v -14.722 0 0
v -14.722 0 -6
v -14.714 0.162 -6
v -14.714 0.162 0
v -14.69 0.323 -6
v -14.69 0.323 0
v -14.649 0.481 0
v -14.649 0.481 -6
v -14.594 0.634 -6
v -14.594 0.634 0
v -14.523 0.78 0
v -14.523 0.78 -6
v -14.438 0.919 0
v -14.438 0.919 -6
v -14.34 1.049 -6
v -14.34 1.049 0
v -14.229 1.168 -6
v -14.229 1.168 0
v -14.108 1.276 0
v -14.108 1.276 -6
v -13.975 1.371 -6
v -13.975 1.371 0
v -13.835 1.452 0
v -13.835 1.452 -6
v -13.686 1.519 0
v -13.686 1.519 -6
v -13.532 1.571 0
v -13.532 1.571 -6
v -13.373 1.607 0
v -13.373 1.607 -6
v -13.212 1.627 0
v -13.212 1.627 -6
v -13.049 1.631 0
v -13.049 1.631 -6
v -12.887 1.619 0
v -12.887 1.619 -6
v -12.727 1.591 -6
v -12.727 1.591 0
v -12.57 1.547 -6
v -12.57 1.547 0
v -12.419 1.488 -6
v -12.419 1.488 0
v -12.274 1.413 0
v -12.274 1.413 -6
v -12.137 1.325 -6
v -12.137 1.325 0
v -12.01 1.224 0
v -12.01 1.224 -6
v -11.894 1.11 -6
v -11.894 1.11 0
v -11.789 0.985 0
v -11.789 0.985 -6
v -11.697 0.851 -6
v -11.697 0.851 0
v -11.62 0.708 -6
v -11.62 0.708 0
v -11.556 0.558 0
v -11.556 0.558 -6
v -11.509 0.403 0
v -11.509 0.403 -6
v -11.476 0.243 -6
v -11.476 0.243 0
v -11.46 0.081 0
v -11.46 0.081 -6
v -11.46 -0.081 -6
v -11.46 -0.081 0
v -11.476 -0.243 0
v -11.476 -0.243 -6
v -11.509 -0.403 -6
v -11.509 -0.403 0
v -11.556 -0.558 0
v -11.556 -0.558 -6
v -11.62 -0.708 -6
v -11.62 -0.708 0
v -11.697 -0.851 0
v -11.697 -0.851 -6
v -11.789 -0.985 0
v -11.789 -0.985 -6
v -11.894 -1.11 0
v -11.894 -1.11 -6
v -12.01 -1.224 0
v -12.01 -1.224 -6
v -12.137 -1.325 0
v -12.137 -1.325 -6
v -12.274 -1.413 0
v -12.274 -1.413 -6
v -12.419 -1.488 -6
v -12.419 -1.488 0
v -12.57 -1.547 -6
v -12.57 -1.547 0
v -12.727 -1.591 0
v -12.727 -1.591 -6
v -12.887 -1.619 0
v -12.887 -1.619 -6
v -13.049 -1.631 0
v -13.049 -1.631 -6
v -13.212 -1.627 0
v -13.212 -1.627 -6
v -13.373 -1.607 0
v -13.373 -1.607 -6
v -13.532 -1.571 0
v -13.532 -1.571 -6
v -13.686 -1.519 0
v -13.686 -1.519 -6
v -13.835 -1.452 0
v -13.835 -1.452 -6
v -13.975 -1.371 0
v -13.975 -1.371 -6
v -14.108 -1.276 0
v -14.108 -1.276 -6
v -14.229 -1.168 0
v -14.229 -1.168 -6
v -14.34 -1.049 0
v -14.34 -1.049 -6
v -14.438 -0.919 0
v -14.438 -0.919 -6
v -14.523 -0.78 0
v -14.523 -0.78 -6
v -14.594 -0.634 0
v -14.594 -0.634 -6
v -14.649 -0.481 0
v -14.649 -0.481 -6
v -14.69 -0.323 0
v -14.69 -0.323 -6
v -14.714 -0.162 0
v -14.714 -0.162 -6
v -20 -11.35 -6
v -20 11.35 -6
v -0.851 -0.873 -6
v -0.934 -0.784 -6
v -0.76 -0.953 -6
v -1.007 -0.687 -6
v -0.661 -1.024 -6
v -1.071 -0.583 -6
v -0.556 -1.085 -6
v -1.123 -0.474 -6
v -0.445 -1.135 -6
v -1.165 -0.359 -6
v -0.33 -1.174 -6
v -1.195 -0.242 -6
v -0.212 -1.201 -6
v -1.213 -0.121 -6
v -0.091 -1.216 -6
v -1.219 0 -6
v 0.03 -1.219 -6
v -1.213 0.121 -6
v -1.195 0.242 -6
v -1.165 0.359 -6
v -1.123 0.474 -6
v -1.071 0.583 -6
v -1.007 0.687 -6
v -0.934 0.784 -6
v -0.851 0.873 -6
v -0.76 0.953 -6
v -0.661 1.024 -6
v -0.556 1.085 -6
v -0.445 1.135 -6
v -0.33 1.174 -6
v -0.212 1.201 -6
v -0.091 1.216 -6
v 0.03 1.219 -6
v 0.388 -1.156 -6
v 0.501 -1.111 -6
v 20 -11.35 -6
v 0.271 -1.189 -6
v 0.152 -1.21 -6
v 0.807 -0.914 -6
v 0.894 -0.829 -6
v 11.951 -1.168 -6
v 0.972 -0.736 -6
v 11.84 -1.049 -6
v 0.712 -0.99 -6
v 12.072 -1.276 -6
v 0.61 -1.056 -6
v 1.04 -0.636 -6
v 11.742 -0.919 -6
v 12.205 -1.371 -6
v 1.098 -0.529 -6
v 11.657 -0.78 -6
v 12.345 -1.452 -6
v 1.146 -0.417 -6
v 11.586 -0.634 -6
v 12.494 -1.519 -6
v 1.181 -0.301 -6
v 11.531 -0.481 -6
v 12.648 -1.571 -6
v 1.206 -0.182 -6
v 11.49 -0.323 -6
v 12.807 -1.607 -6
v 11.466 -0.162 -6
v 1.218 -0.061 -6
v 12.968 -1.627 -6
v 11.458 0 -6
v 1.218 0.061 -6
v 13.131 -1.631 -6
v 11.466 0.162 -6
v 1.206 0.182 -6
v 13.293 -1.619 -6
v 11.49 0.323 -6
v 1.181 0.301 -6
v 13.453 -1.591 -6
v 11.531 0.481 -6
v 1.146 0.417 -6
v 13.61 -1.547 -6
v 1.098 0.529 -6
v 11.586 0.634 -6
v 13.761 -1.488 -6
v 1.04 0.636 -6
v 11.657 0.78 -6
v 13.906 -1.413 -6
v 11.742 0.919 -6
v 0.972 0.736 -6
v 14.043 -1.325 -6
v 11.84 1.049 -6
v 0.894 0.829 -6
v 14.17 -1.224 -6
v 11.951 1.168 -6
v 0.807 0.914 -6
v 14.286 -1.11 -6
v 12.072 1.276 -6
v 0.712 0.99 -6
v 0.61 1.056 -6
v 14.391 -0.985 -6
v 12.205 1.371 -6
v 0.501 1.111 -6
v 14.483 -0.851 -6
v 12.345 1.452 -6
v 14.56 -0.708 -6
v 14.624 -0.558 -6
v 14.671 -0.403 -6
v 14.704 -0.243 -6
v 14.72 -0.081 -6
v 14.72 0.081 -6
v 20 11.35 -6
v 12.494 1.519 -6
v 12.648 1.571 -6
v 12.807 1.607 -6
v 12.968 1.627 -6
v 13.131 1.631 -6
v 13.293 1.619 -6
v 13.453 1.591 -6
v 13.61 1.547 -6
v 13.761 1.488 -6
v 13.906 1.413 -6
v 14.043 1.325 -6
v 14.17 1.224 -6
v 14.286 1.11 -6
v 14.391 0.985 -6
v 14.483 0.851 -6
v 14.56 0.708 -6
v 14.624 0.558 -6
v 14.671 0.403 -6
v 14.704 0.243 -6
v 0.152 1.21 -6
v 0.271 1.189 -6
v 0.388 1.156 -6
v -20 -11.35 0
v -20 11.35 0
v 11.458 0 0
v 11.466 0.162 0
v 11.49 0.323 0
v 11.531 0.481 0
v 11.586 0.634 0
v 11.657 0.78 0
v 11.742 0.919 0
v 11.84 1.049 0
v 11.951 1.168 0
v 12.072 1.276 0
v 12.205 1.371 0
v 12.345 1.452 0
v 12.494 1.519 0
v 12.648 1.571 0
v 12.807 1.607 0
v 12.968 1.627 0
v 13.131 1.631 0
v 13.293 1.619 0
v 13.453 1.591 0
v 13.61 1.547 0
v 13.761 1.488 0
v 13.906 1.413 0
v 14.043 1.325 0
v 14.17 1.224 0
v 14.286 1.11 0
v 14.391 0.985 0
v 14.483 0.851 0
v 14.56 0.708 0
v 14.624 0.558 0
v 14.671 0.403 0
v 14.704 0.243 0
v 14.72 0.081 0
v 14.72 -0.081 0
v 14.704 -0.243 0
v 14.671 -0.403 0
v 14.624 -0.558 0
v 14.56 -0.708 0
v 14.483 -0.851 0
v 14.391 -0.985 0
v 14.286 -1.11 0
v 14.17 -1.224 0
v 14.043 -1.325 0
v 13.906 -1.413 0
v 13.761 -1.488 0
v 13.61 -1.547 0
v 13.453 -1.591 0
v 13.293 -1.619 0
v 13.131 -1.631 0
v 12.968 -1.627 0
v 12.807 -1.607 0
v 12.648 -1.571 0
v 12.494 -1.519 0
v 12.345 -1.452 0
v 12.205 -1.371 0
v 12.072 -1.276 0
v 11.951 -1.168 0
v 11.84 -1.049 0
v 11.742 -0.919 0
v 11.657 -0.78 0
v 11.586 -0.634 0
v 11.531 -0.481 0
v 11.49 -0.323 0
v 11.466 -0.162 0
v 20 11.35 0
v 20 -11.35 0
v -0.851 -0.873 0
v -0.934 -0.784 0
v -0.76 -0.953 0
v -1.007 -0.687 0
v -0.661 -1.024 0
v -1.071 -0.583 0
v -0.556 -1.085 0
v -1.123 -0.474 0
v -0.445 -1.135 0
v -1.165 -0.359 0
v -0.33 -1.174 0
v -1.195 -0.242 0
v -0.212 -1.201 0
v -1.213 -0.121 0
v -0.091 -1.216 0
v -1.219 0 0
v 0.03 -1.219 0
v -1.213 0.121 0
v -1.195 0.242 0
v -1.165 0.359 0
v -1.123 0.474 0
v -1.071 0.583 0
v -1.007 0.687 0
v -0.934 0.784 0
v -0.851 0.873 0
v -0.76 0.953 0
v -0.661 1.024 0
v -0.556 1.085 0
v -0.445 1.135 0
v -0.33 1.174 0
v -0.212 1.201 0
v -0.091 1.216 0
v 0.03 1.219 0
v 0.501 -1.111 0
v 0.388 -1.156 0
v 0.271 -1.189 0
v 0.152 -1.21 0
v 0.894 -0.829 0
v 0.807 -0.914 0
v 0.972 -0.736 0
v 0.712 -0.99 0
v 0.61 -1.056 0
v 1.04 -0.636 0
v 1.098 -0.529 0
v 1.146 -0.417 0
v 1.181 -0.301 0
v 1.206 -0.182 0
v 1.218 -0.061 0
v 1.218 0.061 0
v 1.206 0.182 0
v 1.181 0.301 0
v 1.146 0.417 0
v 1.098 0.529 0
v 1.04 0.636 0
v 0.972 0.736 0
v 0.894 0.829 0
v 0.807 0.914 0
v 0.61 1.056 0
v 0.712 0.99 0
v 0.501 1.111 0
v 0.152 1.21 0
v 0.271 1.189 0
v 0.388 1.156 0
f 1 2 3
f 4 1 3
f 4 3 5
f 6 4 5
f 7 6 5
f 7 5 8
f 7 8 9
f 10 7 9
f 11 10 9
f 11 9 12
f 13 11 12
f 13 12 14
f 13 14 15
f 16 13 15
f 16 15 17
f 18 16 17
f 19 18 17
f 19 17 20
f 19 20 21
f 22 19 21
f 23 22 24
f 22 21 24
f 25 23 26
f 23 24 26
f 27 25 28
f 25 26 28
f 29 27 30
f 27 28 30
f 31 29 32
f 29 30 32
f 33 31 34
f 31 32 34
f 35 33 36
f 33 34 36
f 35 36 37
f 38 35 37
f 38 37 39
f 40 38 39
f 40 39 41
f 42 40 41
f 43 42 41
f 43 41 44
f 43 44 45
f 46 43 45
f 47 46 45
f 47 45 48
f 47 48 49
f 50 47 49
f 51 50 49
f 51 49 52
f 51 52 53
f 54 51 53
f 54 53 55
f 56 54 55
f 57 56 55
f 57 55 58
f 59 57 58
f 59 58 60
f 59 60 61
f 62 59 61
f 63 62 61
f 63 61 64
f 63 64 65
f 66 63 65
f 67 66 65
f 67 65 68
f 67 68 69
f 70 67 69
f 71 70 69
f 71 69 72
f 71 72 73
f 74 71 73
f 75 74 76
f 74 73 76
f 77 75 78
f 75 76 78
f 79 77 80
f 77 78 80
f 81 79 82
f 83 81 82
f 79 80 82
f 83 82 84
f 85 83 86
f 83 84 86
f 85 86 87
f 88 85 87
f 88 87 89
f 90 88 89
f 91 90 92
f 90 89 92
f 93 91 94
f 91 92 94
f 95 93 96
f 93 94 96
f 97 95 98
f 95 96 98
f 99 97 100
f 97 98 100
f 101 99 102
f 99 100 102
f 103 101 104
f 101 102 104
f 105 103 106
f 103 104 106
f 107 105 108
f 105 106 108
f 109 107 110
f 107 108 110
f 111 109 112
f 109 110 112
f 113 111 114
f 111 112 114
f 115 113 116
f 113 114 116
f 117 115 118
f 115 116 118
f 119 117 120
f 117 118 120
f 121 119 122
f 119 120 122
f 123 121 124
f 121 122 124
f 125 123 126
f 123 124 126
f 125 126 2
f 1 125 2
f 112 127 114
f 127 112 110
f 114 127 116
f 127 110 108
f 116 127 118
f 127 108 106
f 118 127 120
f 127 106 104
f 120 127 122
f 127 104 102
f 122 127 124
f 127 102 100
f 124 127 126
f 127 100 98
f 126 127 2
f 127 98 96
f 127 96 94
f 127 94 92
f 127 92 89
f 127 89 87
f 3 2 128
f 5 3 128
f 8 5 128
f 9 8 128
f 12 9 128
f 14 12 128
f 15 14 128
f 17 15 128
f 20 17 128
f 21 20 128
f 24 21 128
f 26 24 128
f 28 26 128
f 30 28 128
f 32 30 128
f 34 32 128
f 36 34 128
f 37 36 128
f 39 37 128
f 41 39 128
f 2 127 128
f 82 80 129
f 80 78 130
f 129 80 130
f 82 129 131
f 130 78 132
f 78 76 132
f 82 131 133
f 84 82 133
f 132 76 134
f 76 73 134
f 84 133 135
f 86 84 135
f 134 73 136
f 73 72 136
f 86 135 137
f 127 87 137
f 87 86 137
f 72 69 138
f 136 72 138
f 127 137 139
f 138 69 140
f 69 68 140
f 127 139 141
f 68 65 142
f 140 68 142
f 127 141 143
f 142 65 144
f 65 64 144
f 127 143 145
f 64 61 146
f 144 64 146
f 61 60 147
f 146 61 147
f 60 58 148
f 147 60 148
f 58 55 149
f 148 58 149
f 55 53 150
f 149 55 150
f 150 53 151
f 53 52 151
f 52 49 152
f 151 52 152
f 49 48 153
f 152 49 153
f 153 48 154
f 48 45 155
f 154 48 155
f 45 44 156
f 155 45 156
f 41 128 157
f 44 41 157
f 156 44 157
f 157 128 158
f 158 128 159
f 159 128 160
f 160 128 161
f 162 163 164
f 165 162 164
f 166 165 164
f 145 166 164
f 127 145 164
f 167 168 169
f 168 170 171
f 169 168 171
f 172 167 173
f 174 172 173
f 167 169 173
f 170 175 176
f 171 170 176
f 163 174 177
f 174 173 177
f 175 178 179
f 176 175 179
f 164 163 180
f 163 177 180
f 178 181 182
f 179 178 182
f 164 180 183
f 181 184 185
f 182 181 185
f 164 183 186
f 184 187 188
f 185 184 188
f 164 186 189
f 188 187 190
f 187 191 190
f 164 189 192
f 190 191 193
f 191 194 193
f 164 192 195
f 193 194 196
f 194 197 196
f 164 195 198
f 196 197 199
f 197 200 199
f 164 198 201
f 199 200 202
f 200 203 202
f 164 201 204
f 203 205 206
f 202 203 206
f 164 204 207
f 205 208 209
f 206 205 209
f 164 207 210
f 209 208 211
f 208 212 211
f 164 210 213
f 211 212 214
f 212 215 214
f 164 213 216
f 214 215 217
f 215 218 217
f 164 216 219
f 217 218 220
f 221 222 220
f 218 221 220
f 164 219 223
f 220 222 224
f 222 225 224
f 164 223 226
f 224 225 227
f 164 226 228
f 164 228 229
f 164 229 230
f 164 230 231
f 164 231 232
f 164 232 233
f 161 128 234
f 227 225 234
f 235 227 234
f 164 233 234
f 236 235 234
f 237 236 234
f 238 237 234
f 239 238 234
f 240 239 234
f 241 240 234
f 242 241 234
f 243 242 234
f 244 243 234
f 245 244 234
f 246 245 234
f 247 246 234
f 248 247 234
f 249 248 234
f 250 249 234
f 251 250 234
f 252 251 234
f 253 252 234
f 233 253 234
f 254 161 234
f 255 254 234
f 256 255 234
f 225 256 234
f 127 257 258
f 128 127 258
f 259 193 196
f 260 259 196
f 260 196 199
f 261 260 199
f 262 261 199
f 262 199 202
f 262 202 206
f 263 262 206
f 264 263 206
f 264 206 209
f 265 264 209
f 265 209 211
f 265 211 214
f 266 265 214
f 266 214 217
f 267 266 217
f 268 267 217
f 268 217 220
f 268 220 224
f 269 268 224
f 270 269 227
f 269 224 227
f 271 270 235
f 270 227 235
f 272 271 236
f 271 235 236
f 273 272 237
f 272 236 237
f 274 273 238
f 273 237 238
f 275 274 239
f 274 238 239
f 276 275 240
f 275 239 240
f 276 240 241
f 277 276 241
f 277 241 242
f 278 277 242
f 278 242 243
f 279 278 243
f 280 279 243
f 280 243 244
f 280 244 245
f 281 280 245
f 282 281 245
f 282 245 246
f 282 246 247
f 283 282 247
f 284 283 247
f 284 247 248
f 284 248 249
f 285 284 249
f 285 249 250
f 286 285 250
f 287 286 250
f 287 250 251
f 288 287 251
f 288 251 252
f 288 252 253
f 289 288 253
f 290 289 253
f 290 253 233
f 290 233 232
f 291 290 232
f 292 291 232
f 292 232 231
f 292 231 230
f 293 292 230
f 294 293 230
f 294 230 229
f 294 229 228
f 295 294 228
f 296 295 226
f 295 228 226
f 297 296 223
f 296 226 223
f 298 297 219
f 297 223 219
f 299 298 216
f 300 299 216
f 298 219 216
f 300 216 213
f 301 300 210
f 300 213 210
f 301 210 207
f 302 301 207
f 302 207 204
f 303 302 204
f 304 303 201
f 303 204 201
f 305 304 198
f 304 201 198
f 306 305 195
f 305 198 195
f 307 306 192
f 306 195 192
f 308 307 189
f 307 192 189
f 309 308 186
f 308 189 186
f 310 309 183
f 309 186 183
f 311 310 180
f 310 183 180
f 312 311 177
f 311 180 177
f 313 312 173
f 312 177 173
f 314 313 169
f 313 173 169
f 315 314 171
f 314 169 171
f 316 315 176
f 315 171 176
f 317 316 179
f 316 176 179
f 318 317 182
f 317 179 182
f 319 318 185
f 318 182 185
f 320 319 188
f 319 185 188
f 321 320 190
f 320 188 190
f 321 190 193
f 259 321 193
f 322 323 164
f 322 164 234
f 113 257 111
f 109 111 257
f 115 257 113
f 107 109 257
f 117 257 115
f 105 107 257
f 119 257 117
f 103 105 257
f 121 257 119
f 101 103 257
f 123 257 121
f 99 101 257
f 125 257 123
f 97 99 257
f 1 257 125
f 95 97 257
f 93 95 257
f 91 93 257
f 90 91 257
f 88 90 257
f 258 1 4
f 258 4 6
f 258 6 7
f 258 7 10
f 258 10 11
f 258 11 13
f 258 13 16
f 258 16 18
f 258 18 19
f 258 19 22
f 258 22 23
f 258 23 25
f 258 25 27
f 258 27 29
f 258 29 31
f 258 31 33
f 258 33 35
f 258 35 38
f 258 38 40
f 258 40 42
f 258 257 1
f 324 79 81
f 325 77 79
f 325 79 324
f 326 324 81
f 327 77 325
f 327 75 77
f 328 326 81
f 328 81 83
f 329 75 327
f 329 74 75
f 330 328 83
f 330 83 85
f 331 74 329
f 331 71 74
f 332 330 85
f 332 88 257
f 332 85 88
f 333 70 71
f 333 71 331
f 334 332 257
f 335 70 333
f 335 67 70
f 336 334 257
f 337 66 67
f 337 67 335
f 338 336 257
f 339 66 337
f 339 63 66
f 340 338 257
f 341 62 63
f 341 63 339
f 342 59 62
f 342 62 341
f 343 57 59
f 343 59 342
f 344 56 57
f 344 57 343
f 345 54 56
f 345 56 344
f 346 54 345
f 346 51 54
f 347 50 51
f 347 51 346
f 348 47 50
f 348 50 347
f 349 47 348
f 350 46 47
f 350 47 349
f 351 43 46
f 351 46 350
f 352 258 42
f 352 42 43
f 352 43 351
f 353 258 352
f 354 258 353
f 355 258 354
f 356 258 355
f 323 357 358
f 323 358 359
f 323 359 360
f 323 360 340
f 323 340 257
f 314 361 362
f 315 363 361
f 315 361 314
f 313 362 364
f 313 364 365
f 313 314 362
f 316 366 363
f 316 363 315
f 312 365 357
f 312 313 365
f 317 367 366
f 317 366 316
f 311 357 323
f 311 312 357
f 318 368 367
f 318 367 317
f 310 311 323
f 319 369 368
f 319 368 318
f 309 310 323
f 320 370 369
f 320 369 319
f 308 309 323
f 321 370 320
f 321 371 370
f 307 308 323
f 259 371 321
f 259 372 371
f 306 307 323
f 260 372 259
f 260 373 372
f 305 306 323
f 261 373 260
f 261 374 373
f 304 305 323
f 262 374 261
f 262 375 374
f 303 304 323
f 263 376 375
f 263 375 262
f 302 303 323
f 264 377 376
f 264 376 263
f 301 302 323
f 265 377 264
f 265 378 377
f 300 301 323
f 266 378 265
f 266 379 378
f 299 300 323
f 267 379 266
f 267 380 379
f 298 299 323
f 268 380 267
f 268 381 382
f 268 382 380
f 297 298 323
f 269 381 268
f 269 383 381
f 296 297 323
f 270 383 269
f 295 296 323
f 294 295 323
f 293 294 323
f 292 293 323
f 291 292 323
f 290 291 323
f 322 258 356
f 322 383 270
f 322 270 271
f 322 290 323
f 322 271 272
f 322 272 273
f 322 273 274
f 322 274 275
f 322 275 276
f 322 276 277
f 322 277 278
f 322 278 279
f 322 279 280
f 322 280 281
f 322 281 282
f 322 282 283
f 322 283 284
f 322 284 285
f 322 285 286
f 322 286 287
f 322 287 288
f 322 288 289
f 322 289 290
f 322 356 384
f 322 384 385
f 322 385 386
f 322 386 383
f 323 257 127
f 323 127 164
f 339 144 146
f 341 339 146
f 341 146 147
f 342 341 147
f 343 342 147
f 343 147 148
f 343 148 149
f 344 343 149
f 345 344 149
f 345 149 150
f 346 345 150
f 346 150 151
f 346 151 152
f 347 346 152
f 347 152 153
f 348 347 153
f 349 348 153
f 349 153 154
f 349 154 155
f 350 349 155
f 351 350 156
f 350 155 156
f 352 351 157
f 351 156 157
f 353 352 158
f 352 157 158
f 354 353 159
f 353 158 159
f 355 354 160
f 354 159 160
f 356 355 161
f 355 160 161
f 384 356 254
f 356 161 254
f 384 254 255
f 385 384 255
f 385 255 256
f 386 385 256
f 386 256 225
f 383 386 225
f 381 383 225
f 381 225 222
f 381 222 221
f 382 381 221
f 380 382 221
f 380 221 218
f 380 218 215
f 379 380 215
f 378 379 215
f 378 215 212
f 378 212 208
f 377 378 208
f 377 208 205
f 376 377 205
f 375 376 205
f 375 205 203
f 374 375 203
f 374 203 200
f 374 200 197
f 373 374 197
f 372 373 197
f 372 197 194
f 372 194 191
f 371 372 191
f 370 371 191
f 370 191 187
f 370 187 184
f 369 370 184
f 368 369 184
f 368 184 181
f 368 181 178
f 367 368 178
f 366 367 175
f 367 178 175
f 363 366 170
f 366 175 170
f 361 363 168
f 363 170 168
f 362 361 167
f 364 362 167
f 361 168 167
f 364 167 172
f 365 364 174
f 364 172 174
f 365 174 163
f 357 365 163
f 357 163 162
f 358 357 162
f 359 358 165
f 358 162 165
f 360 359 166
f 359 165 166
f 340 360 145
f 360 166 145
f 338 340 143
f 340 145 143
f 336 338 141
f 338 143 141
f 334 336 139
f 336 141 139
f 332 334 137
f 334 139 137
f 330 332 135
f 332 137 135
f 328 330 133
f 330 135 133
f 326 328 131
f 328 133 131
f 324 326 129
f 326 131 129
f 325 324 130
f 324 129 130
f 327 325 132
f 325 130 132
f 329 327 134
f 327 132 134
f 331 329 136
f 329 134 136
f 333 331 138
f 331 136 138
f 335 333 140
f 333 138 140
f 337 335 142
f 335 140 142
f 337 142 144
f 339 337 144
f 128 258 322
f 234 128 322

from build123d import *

# Parameters (mm, degrees)
SKETCH1_W             = 40
SKETCH1_H             = 22.7
BOSS_EXTRUDE1_DEPTH   = 6
F_4_CLEARANCE_HOLE1_D = 3.2639
F_2_CLEARANCE_HOLE1_D = 2.4384


with BuildPart() as part:
    # Sketch1 → Boss-Extrude1 (new body)
    with BuildSketch(Plane.XY):
        Rectangle(SKETCH1_W, SKETCH1_H)
    extrude(amount=-BOSS_EXTRUDE1_DEPTH)

    # #4 Clearance Hole1 (through all)
    with Locations(Plane.XY):
        with Locations((-13.09, 0), (13.09, 0)):
            Hole(F_4_CLEARANCE_HOLE1_D / 2)

    # #2 Clearance Hole1 (through all)
    with Locations(Plane.XY):
        with Locations((0, 0)):
            Hole(F_2_CLEARANCE_HOLE1_D / 2)


solid = part.part
